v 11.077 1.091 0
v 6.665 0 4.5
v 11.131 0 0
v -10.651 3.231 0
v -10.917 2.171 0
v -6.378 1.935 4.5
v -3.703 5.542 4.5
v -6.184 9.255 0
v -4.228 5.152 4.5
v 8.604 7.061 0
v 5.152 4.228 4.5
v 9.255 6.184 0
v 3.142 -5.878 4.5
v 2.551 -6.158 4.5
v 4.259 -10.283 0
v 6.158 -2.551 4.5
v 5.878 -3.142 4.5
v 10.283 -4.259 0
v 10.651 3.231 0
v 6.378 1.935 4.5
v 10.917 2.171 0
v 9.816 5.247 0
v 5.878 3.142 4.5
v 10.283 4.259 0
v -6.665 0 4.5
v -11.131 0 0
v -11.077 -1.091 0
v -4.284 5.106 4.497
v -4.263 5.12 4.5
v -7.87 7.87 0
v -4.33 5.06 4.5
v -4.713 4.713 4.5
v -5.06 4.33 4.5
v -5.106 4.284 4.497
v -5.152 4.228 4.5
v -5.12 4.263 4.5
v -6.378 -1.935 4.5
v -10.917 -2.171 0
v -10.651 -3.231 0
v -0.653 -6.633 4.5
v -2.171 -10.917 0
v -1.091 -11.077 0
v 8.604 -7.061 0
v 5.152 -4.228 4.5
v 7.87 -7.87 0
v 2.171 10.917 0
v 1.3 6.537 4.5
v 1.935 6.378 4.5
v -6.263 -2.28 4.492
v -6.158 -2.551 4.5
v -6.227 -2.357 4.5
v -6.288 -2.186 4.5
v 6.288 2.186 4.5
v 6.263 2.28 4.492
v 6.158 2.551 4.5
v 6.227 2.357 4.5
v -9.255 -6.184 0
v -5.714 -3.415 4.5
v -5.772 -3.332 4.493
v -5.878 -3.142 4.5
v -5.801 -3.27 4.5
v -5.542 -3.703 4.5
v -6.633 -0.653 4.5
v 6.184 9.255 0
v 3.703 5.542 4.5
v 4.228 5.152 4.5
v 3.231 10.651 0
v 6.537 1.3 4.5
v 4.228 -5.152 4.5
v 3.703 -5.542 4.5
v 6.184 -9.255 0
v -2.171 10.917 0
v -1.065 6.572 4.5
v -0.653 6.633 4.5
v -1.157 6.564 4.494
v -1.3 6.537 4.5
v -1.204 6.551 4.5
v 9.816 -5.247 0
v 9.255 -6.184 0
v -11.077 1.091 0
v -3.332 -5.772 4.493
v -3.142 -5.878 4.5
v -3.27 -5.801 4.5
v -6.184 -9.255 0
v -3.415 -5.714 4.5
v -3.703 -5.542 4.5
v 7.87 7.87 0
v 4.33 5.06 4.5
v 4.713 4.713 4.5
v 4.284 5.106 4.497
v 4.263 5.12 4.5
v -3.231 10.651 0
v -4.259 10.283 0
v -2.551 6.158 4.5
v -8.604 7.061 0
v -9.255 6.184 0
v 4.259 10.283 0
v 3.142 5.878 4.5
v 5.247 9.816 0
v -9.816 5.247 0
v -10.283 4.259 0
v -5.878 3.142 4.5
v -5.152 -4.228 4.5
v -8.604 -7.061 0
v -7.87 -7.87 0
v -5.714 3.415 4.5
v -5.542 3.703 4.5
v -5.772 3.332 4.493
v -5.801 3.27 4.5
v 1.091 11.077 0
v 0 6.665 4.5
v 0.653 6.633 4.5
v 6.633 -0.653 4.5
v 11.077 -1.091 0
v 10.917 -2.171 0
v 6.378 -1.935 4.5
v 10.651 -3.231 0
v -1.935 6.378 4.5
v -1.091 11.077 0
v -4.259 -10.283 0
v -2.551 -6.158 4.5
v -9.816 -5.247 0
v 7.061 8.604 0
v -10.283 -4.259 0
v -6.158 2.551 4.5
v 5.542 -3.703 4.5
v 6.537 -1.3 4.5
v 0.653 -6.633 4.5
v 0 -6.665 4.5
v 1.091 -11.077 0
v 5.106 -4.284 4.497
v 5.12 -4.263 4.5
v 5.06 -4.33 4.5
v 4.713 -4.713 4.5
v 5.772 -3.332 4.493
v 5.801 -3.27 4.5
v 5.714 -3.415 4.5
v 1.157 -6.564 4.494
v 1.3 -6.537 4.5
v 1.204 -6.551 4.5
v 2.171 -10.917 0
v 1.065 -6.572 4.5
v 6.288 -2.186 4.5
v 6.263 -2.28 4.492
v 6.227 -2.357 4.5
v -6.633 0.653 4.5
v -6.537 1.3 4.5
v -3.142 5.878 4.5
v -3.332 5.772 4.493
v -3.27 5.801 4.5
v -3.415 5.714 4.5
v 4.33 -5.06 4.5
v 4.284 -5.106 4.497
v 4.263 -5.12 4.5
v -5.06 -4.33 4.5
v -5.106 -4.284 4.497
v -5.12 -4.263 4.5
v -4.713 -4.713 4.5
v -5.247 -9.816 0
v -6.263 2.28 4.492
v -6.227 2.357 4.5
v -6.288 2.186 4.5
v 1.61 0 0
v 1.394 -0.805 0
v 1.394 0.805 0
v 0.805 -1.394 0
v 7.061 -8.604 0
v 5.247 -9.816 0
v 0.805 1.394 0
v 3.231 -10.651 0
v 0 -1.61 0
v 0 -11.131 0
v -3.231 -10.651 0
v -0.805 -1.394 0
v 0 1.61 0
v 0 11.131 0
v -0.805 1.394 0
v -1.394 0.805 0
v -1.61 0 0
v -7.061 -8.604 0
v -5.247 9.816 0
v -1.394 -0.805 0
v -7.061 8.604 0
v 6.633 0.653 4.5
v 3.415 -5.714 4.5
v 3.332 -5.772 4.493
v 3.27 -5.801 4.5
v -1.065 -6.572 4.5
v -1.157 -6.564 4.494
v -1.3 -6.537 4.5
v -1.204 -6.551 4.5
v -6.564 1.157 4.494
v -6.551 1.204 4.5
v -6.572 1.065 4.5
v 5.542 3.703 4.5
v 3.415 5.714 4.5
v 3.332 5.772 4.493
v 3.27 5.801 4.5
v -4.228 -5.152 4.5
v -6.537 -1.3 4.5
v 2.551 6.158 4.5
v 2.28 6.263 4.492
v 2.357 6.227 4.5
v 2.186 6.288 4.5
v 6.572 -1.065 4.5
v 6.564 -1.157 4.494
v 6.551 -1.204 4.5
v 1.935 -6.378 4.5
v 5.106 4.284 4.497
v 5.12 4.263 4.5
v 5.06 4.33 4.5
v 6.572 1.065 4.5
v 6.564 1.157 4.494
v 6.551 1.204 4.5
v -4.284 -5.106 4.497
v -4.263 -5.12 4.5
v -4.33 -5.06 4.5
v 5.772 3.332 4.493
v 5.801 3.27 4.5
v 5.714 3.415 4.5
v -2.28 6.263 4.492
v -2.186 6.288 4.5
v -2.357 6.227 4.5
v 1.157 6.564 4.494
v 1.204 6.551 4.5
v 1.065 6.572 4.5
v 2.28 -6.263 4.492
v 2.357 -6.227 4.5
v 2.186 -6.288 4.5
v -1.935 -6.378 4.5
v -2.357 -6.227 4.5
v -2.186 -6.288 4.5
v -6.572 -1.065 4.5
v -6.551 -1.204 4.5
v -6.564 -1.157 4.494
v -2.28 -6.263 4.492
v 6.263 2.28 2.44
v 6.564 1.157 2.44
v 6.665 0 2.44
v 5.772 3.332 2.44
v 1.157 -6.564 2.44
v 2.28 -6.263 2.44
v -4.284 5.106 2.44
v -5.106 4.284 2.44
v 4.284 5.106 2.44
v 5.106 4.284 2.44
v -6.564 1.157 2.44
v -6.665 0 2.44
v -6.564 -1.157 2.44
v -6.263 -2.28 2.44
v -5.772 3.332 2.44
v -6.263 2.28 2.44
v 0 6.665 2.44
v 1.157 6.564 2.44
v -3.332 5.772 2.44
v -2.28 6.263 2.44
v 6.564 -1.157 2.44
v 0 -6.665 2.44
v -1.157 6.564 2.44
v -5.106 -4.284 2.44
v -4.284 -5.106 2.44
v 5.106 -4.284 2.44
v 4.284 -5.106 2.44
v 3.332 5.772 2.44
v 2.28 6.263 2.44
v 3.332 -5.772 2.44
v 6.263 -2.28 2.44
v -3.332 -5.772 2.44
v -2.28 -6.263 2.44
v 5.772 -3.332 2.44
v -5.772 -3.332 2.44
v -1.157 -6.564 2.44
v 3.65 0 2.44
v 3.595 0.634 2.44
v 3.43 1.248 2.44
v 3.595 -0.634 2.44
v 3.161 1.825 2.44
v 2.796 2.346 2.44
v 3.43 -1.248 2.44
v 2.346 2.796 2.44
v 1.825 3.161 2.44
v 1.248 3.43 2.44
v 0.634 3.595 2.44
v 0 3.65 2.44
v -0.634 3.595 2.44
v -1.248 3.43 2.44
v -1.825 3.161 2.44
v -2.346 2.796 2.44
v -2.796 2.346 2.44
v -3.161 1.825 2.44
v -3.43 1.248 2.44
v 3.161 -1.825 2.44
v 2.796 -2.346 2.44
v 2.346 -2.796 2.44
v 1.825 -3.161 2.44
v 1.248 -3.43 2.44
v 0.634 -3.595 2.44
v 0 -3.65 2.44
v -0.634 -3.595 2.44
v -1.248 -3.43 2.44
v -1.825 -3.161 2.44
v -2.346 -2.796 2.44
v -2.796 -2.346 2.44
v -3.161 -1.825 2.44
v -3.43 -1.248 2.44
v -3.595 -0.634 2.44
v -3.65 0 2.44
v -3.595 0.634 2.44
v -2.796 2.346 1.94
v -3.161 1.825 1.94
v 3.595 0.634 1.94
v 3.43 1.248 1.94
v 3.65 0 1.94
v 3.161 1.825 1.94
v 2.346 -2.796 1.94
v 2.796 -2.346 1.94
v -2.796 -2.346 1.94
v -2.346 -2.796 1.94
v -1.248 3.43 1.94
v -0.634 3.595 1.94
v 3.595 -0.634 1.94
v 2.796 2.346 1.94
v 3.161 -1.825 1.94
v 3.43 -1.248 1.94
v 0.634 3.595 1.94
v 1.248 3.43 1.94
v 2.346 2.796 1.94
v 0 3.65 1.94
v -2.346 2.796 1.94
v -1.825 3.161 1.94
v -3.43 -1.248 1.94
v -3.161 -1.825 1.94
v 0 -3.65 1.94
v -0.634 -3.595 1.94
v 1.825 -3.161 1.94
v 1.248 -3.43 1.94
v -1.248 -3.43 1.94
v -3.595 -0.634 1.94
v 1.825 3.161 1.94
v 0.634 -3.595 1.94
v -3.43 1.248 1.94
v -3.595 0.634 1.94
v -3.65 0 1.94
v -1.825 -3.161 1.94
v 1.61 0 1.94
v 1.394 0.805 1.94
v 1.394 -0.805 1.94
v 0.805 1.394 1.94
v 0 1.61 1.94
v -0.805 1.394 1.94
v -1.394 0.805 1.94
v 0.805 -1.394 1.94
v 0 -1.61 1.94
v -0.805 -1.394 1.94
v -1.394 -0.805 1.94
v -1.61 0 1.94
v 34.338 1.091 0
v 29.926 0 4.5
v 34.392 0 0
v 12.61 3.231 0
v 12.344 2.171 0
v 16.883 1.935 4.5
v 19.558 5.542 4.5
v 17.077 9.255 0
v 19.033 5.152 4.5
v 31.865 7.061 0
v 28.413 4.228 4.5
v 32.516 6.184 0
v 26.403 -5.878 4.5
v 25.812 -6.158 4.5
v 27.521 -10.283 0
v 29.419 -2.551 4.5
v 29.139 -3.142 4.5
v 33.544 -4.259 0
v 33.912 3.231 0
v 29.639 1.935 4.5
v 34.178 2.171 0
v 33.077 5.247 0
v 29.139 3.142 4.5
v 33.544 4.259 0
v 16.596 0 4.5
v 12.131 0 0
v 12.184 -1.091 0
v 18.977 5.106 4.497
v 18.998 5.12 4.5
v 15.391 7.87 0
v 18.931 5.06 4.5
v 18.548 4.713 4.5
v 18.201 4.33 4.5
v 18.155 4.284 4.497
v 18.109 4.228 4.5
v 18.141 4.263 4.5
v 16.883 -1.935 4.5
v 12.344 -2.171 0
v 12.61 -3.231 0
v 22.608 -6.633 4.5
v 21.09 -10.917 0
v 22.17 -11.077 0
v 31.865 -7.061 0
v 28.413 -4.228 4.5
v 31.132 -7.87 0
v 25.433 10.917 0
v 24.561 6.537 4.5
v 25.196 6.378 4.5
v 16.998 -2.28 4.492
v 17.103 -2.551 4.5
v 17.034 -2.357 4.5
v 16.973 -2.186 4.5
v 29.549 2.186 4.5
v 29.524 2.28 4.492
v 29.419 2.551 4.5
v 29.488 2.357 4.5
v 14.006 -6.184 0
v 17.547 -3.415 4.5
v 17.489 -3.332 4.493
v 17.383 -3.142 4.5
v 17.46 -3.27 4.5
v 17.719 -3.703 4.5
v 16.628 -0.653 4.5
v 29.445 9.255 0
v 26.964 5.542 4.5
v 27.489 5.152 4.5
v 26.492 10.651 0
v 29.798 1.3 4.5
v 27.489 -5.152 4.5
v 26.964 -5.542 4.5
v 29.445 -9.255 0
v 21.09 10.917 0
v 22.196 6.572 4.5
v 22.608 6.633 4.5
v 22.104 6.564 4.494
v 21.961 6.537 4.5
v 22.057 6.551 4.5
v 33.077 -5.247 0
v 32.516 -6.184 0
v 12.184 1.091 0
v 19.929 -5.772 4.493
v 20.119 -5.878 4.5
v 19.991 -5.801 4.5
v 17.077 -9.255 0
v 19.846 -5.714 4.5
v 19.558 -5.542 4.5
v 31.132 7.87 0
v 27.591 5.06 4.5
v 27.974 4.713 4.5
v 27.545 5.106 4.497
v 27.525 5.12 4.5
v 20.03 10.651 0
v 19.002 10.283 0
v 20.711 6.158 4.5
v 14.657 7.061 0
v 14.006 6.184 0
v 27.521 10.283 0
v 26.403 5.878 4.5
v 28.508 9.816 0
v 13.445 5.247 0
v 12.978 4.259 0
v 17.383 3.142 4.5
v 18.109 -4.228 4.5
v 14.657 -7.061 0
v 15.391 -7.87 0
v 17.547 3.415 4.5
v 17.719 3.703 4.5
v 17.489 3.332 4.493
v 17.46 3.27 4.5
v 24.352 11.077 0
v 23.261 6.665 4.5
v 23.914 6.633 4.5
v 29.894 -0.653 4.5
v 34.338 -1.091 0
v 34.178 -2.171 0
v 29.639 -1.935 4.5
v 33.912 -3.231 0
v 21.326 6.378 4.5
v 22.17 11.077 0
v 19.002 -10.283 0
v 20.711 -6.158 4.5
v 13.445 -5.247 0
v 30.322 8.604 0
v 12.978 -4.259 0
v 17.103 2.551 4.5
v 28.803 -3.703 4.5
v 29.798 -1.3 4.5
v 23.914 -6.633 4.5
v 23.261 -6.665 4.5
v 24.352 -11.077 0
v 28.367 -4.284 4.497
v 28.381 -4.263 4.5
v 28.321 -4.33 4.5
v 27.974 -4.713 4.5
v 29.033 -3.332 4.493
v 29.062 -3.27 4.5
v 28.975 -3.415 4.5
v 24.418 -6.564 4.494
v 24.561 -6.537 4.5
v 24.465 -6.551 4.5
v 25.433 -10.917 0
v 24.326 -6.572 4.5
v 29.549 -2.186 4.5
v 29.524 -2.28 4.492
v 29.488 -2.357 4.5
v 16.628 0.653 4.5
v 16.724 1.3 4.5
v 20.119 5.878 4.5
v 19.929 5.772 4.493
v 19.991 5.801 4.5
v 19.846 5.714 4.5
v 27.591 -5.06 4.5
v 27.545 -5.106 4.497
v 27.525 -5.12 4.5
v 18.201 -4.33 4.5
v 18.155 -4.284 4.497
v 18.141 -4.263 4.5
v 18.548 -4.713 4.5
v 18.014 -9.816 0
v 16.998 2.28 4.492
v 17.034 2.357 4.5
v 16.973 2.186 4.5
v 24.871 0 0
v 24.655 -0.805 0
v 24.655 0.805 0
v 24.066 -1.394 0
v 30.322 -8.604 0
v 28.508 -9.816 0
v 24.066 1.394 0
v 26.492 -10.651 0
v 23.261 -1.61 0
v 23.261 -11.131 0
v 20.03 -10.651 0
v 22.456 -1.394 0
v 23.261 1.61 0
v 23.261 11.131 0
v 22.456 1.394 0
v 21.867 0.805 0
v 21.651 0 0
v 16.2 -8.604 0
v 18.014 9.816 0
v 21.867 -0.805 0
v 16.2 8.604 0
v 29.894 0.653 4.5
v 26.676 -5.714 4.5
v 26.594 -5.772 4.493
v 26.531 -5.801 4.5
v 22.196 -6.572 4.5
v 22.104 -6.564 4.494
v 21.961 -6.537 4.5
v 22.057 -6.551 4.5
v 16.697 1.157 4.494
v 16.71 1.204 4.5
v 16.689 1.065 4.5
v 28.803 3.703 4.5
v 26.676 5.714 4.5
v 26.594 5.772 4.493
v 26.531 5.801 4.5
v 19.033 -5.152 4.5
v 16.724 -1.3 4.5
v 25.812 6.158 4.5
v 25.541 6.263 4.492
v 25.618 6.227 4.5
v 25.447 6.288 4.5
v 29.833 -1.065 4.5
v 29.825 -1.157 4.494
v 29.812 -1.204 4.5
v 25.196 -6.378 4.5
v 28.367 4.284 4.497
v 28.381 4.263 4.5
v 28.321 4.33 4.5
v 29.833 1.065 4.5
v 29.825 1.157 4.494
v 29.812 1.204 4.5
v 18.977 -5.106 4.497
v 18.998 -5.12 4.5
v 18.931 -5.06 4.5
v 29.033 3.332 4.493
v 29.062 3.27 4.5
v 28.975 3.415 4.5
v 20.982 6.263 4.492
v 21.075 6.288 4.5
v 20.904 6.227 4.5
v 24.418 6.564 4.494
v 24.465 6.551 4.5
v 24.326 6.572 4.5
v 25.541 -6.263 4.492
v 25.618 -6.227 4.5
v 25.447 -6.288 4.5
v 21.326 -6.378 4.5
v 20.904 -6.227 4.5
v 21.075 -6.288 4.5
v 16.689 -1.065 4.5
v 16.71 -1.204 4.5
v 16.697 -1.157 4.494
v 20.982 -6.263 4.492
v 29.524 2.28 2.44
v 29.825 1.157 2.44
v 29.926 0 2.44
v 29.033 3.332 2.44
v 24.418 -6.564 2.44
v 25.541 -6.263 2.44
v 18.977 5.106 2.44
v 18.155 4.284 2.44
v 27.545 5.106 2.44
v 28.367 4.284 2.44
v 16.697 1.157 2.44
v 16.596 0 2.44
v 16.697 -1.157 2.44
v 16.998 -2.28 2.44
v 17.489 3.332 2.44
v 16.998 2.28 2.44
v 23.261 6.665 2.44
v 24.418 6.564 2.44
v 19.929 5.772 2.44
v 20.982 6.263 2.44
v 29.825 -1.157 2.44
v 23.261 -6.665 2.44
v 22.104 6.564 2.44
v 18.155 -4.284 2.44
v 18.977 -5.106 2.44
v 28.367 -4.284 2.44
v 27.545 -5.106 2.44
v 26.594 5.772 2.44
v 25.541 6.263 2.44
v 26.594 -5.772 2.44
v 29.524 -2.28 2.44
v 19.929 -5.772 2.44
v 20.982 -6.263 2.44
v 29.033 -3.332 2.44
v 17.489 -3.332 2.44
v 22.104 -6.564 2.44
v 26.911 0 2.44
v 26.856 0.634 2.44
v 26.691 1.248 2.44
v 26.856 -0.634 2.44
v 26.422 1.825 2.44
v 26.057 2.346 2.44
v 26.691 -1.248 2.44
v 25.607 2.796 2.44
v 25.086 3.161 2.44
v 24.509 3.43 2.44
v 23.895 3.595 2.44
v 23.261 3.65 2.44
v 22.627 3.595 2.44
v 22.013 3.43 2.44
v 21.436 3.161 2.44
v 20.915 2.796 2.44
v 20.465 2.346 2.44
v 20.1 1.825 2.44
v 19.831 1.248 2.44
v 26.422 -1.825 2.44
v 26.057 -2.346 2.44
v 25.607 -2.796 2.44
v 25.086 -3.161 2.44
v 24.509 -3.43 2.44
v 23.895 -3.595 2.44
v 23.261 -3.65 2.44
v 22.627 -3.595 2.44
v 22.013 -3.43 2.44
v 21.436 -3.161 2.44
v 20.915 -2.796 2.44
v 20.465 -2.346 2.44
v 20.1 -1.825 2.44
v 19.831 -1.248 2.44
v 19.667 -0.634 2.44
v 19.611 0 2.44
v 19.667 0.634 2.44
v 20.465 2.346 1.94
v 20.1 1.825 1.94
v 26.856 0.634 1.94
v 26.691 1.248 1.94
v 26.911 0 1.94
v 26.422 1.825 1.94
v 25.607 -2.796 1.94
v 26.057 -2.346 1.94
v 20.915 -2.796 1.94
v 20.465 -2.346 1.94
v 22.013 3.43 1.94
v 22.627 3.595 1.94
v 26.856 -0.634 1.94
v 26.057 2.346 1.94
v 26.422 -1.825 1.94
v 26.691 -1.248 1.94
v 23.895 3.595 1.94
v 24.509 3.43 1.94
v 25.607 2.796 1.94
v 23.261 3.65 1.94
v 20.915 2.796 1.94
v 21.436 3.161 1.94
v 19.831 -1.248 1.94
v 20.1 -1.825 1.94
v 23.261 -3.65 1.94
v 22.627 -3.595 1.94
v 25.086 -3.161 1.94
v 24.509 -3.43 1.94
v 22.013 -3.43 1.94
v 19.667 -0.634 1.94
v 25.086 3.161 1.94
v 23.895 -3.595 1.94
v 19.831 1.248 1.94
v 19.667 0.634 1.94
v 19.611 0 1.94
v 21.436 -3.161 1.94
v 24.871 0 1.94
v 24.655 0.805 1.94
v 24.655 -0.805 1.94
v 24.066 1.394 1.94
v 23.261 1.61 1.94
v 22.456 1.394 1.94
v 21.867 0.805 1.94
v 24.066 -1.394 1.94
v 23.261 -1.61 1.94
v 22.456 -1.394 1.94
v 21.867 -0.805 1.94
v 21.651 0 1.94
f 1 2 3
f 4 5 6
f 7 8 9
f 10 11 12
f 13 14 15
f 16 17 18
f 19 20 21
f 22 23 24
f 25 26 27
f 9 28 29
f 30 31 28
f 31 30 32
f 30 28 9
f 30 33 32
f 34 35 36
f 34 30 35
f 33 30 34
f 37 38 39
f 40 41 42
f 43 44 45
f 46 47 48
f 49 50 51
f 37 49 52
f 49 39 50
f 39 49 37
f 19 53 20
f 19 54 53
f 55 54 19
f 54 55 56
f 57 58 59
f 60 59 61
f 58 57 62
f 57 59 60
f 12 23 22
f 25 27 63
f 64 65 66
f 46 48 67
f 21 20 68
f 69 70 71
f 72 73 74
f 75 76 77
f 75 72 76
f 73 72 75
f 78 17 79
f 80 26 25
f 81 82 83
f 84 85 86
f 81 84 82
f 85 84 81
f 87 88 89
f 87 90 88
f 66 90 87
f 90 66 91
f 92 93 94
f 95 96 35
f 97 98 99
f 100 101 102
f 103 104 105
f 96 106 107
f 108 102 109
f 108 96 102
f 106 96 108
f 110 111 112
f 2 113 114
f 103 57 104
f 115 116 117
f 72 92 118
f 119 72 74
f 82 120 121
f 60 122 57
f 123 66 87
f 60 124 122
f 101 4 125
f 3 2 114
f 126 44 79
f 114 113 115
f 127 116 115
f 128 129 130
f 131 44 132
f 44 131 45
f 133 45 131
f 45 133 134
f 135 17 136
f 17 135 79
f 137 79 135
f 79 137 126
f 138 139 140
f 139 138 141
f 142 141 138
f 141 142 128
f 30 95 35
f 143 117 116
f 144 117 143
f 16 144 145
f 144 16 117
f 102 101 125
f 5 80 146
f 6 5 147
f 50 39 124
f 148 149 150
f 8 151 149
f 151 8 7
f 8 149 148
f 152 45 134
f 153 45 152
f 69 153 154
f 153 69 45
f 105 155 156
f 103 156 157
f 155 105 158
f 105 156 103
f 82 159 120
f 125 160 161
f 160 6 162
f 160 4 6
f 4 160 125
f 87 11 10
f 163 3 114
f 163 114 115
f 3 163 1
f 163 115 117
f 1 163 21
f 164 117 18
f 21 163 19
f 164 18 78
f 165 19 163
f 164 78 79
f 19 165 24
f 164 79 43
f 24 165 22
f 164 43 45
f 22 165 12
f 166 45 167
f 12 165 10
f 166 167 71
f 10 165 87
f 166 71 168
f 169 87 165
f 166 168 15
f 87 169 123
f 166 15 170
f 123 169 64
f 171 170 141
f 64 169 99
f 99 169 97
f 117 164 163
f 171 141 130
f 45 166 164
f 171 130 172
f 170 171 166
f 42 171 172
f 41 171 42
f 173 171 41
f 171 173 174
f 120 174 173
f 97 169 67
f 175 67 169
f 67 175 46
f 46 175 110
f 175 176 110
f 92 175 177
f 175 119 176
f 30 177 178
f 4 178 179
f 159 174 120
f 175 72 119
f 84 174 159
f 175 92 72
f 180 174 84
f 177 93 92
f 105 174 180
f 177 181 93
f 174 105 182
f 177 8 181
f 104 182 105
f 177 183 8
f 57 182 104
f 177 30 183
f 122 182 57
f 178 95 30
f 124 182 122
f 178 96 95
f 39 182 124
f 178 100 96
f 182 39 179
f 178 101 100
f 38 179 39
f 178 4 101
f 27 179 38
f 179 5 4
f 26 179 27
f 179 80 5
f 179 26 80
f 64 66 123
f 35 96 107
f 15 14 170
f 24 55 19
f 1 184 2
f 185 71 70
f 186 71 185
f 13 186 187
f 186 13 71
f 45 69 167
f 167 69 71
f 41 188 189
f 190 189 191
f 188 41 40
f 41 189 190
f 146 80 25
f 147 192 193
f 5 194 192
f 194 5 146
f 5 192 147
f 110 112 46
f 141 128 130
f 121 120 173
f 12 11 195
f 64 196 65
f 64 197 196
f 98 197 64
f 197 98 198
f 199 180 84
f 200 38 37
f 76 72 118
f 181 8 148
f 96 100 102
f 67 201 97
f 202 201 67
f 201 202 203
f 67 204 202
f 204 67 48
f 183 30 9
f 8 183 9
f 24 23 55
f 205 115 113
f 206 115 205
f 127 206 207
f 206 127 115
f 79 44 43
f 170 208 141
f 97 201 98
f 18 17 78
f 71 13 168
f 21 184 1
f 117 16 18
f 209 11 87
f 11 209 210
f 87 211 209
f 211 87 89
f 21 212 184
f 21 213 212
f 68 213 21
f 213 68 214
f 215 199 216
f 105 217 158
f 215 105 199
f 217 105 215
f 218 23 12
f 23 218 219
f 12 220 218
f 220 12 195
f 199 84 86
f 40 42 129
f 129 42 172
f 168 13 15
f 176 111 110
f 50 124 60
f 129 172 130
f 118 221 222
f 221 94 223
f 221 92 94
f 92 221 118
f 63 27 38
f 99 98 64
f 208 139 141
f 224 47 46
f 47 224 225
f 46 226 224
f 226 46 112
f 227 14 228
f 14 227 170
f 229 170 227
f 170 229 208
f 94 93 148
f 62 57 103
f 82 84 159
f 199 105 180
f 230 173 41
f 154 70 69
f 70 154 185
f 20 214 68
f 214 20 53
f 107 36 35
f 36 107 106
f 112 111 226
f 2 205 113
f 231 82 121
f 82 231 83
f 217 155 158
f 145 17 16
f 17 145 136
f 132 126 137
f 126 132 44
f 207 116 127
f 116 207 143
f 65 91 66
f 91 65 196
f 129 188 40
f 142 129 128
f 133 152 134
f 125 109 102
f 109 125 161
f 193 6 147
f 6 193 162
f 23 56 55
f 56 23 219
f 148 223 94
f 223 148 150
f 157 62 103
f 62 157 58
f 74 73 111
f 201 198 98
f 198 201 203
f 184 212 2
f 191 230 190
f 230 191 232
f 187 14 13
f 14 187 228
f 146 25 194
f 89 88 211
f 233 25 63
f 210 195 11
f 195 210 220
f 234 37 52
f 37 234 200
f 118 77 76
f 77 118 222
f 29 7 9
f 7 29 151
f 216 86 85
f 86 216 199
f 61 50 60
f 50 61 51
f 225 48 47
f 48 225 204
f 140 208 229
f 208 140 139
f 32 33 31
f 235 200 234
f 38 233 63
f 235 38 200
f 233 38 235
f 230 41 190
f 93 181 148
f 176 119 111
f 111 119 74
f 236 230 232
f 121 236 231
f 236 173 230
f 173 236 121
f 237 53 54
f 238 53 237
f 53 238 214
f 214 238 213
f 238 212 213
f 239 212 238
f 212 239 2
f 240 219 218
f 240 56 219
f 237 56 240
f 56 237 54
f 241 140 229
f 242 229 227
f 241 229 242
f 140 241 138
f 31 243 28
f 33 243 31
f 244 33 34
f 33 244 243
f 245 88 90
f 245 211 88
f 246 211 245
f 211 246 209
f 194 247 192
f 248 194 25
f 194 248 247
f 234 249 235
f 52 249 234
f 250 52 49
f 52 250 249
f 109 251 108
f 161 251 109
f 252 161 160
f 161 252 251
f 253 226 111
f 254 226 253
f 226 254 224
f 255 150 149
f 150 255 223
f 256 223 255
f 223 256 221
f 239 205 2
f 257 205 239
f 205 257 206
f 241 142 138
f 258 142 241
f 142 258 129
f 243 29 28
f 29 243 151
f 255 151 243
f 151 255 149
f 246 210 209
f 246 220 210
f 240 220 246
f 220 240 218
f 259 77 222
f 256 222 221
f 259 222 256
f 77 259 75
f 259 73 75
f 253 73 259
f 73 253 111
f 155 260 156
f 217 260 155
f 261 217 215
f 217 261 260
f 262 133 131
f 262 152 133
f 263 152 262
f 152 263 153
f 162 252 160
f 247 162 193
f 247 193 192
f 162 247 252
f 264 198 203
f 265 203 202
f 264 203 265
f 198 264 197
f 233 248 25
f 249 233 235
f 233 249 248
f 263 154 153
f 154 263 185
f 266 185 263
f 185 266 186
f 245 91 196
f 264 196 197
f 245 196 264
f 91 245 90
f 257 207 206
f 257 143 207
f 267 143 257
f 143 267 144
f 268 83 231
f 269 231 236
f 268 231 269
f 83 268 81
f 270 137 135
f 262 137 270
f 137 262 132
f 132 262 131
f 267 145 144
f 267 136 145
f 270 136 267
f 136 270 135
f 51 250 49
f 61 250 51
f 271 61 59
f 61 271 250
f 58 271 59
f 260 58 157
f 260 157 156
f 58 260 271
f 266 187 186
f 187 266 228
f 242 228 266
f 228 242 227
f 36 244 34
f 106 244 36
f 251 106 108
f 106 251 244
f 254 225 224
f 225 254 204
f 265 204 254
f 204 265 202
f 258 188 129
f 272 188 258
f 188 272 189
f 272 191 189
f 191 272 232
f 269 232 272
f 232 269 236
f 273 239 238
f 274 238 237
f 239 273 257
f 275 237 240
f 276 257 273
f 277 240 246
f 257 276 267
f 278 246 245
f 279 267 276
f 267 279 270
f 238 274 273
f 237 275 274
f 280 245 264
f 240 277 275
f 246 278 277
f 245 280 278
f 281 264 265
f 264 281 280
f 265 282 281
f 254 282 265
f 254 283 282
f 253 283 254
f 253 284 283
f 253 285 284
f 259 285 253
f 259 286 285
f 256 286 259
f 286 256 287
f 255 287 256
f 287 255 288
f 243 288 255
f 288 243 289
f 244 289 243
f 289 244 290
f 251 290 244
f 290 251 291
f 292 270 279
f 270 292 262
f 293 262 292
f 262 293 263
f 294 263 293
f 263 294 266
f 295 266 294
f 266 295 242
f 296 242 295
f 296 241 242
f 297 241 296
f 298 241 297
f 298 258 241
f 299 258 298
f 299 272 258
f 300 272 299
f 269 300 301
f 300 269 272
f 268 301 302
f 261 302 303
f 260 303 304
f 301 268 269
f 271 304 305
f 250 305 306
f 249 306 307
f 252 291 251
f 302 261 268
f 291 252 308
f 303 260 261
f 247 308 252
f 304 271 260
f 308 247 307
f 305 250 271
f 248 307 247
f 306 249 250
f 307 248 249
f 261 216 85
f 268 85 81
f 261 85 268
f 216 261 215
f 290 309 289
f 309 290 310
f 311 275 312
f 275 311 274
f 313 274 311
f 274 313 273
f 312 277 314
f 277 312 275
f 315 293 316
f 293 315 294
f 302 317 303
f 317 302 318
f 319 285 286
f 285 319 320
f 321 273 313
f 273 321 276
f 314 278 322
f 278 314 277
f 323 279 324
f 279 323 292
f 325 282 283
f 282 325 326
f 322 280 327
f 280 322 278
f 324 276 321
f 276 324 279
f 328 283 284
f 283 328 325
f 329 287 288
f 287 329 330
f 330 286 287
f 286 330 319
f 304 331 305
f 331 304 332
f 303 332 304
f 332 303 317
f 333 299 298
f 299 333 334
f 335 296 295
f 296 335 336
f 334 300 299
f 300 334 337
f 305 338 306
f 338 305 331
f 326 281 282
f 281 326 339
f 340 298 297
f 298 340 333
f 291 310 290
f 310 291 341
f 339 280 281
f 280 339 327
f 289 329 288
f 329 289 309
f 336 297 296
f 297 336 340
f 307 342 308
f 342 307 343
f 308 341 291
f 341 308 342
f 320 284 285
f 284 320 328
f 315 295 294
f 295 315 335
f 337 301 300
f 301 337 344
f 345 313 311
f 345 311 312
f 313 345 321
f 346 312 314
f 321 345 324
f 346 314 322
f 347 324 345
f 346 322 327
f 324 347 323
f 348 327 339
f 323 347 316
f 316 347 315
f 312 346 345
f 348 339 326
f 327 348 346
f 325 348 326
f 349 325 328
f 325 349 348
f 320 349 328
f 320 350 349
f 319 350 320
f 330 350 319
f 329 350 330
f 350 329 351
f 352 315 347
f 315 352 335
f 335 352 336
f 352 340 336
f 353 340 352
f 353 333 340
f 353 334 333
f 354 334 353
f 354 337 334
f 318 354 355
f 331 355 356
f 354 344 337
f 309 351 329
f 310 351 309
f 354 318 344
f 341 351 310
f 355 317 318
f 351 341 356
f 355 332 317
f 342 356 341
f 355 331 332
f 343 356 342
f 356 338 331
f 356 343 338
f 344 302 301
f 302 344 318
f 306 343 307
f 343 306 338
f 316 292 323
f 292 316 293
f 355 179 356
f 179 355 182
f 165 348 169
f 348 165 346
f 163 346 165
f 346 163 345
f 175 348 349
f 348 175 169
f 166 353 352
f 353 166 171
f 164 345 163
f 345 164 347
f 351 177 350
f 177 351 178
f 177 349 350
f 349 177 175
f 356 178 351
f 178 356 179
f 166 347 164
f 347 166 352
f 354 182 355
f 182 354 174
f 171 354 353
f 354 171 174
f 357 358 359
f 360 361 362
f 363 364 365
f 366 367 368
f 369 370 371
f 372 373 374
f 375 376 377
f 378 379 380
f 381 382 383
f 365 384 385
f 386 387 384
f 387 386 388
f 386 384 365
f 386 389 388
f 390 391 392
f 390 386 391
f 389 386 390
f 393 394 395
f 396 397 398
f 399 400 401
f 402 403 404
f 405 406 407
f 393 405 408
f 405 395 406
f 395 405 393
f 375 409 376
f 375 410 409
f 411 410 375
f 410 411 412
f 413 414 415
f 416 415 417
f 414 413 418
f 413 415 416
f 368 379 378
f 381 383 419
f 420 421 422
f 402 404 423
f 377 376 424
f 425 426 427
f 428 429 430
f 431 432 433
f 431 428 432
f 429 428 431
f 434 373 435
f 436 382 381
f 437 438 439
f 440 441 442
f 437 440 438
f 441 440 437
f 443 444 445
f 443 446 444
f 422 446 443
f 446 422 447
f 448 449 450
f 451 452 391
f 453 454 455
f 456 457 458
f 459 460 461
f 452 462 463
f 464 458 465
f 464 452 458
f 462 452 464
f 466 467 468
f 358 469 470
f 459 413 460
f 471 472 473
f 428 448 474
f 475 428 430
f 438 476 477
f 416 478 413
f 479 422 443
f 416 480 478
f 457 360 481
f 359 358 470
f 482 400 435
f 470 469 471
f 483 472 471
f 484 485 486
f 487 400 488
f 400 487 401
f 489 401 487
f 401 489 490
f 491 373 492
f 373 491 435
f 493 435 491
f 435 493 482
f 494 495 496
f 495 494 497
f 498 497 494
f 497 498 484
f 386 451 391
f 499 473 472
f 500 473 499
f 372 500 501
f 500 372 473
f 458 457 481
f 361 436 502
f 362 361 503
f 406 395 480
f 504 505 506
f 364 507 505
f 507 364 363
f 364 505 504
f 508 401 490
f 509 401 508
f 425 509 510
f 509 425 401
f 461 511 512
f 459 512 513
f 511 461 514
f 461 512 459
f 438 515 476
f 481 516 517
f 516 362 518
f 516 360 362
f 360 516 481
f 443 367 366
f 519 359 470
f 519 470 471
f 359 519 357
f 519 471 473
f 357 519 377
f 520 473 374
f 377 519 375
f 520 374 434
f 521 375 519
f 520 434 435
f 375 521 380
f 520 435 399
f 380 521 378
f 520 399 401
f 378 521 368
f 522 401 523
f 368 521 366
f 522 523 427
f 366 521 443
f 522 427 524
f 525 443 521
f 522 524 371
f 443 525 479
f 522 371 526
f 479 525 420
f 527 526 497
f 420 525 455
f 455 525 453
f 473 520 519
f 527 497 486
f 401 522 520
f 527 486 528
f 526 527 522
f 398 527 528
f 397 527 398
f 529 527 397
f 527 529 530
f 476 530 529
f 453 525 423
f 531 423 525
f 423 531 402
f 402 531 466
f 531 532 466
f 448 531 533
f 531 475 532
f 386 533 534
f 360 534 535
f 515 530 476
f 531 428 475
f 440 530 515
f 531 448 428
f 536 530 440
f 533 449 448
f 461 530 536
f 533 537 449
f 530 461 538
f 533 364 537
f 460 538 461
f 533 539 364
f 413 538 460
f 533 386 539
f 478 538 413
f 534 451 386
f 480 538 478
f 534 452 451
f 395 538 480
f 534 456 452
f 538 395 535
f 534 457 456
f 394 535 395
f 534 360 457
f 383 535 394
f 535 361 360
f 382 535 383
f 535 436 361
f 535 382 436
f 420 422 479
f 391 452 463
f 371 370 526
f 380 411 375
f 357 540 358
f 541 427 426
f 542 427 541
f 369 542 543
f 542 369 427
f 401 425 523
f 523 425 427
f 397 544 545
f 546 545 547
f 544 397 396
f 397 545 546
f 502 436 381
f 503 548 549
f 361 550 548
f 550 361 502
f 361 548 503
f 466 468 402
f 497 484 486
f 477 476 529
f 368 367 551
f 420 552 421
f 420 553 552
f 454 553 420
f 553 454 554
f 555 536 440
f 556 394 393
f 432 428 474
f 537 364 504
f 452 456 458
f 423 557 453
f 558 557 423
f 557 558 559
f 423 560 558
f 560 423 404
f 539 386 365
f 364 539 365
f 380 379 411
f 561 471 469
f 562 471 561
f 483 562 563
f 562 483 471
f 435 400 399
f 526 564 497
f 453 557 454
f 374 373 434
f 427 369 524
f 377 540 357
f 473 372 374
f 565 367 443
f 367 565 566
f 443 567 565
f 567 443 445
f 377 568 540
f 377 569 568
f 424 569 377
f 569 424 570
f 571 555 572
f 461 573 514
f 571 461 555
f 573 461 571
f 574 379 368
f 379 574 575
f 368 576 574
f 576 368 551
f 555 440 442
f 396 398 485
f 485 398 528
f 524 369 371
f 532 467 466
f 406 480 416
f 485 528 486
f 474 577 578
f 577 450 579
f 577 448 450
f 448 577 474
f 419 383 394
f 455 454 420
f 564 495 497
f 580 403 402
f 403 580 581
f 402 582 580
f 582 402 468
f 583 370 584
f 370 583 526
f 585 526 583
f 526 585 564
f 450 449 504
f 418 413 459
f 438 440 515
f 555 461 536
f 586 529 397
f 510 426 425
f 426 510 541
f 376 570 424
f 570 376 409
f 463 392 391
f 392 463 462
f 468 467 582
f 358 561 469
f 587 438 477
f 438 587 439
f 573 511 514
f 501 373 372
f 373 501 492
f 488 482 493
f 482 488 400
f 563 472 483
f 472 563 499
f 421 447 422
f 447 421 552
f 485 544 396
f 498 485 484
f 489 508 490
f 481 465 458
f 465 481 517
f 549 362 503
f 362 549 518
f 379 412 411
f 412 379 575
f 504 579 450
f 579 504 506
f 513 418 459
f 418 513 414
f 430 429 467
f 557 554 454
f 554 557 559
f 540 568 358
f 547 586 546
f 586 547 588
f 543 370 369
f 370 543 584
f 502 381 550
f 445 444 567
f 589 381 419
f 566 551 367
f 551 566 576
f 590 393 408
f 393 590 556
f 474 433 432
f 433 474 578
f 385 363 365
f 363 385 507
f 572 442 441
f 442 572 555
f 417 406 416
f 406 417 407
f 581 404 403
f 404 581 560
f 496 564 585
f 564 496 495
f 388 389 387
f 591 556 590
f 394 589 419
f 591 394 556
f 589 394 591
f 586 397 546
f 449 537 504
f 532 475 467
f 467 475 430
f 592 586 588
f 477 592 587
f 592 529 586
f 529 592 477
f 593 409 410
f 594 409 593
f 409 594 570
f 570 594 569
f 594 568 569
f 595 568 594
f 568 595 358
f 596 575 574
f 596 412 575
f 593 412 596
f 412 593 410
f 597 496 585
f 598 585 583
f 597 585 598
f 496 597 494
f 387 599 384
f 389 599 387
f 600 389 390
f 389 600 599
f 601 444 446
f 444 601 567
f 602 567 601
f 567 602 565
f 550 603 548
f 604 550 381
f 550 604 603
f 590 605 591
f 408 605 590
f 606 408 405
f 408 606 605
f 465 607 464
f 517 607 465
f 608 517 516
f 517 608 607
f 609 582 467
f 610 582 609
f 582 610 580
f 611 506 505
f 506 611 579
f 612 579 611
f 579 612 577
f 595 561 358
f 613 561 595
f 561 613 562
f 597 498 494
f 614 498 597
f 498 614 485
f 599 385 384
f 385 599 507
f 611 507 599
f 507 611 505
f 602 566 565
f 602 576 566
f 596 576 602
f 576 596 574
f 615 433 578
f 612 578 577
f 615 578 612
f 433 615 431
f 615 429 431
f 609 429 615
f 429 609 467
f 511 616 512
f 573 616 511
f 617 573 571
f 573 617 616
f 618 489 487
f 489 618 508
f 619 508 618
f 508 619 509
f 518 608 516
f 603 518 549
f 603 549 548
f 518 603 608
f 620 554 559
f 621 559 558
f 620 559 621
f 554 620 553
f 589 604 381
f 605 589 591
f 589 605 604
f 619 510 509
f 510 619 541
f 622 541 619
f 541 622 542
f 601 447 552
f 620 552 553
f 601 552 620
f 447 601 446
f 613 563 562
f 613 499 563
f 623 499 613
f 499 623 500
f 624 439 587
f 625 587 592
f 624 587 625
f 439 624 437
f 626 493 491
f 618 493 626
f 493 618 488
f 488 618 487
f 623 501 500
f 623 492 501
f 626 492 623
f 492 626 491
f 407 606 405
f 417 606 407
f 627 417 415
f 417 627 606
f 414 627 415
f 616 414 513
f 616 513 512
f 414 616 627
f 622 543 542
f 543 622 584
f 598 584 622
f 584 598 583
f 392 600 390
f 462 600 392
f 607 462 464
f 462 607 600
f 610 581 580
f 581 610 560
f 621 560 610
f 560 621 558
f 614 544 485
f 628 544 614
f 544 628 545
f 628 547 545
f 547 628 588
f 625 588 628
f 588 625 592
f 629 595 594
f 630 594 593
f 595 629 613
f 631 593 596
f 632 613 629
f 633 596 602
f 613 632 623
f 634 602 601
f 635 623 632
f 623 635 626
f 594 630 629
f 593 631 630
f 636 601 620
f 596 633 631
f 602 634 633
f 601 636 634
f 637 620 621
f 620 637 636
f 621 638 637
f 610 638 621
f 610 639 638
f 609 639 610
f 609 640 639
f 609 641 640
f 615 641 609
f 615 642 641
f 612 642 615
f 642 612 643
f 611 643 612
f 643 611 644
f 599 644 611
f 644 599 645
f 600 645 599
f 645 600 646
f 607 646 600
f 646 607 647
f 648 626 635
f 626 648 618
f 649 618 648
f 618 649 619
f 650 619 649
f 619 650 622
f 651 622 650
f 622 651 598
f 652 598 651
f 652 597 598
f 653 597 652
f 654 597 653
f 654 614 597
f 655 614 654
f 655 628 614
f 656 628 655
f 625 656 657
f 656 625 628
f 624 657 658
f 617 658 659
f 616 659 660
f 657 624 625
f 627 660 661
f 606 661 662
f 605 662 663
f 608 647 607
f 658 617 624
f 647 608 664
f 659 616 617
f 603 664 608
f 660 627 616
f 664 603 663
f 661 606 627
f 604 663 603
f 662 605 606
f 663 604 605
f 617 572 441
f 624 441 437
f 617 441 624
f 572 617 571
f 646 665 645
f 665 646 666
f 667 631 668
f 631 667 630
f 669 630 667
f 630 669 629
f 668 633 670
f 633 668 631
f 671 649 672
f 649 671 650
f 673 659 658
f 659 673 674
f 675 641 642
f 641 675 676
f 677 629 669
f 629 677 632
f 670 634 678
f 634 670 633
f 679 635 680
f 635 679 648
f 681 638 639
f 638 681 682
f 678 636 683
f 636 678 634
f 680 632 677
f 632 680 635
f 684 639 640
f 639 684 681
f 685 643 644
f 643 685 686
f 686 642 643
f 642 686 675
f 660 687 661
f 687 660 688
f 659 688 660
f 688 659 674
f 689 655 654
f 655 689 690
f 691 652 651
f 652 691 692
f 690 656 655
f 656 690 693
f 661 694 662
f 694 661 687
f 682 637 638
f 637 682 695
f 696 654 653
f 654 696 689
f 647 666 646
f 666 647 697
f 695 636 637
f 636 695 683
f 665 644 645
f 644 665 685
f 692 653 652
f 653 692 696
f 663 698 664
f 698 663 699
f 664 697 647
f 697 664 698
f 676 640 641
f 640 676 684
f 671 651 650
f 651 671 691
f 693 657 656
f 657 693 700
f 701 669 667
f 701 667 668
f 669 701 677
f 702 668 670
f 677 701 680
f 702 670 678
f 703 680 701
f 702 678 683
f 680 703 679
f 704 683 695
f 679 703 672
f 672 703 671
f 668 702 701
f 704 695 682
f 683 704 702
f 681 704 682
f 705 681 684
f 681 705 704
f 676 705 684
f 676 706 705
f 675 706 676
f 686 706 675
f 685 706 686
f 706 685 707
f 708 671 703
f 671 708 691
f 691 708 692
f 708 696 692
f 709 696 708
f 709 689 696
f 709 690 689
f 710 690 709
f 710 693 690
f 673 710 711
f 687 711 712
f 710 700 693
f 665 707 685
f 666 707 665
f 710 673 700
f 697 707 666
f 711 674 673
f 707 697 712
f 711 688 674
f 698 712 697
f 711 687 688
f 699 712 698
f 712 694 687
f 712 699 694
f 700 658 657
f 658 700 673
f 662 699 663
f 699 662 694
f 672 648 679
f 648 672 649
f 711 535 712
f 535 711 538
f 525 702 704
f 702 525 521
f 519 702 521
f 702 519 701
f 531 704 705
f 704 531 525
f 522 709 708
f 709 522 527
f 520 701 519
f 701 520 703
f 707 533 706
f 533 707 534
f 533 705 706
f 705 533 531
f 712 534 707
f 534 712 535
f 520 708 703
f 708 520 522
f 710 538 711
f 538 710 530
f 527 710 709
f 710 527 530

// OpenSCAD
// goal here is to press two halves togther around a bearing and let
// the line run directly on the bearing surface
// remember to allow a bit extra for washers on the outside
// of the bearing sandwich

// using m3 zinc washer and a leftover m3 bearing

bearing_rad=13.33/2; // measured 12.65
base_rad=bearing_rad*1.67;
bearing_width=4.31;
gap_width=9;
washerH=.5;
washerD=7.3; // measured 6.78

module bhalf(){
difference(){
cylinder(r1=base_rad, r2=bearing_rad, h=gap_width/2, center=true, $fn=64);
// bearing cut-out
translate([0,0,gap_width/2 - bearing_width/2])
	cylinder(r=bearing_rad, h=bearing_width, center=true, $fn=36);
// washer cut-out
translate([0,0,gap_width/2 - bearing_width - washerH/2])
	cylinder(r=washerD/2, h=washerH, center=true, $fn=36);
// m3 bolt hole
cylinder(r=1.61, h=gap_width, center=true, $fn=12);
}
}
translate([0,0,gap_width/4])
bhalf();
translate([base_rad*2+1,0,gap_width/4])
	bhalf();
